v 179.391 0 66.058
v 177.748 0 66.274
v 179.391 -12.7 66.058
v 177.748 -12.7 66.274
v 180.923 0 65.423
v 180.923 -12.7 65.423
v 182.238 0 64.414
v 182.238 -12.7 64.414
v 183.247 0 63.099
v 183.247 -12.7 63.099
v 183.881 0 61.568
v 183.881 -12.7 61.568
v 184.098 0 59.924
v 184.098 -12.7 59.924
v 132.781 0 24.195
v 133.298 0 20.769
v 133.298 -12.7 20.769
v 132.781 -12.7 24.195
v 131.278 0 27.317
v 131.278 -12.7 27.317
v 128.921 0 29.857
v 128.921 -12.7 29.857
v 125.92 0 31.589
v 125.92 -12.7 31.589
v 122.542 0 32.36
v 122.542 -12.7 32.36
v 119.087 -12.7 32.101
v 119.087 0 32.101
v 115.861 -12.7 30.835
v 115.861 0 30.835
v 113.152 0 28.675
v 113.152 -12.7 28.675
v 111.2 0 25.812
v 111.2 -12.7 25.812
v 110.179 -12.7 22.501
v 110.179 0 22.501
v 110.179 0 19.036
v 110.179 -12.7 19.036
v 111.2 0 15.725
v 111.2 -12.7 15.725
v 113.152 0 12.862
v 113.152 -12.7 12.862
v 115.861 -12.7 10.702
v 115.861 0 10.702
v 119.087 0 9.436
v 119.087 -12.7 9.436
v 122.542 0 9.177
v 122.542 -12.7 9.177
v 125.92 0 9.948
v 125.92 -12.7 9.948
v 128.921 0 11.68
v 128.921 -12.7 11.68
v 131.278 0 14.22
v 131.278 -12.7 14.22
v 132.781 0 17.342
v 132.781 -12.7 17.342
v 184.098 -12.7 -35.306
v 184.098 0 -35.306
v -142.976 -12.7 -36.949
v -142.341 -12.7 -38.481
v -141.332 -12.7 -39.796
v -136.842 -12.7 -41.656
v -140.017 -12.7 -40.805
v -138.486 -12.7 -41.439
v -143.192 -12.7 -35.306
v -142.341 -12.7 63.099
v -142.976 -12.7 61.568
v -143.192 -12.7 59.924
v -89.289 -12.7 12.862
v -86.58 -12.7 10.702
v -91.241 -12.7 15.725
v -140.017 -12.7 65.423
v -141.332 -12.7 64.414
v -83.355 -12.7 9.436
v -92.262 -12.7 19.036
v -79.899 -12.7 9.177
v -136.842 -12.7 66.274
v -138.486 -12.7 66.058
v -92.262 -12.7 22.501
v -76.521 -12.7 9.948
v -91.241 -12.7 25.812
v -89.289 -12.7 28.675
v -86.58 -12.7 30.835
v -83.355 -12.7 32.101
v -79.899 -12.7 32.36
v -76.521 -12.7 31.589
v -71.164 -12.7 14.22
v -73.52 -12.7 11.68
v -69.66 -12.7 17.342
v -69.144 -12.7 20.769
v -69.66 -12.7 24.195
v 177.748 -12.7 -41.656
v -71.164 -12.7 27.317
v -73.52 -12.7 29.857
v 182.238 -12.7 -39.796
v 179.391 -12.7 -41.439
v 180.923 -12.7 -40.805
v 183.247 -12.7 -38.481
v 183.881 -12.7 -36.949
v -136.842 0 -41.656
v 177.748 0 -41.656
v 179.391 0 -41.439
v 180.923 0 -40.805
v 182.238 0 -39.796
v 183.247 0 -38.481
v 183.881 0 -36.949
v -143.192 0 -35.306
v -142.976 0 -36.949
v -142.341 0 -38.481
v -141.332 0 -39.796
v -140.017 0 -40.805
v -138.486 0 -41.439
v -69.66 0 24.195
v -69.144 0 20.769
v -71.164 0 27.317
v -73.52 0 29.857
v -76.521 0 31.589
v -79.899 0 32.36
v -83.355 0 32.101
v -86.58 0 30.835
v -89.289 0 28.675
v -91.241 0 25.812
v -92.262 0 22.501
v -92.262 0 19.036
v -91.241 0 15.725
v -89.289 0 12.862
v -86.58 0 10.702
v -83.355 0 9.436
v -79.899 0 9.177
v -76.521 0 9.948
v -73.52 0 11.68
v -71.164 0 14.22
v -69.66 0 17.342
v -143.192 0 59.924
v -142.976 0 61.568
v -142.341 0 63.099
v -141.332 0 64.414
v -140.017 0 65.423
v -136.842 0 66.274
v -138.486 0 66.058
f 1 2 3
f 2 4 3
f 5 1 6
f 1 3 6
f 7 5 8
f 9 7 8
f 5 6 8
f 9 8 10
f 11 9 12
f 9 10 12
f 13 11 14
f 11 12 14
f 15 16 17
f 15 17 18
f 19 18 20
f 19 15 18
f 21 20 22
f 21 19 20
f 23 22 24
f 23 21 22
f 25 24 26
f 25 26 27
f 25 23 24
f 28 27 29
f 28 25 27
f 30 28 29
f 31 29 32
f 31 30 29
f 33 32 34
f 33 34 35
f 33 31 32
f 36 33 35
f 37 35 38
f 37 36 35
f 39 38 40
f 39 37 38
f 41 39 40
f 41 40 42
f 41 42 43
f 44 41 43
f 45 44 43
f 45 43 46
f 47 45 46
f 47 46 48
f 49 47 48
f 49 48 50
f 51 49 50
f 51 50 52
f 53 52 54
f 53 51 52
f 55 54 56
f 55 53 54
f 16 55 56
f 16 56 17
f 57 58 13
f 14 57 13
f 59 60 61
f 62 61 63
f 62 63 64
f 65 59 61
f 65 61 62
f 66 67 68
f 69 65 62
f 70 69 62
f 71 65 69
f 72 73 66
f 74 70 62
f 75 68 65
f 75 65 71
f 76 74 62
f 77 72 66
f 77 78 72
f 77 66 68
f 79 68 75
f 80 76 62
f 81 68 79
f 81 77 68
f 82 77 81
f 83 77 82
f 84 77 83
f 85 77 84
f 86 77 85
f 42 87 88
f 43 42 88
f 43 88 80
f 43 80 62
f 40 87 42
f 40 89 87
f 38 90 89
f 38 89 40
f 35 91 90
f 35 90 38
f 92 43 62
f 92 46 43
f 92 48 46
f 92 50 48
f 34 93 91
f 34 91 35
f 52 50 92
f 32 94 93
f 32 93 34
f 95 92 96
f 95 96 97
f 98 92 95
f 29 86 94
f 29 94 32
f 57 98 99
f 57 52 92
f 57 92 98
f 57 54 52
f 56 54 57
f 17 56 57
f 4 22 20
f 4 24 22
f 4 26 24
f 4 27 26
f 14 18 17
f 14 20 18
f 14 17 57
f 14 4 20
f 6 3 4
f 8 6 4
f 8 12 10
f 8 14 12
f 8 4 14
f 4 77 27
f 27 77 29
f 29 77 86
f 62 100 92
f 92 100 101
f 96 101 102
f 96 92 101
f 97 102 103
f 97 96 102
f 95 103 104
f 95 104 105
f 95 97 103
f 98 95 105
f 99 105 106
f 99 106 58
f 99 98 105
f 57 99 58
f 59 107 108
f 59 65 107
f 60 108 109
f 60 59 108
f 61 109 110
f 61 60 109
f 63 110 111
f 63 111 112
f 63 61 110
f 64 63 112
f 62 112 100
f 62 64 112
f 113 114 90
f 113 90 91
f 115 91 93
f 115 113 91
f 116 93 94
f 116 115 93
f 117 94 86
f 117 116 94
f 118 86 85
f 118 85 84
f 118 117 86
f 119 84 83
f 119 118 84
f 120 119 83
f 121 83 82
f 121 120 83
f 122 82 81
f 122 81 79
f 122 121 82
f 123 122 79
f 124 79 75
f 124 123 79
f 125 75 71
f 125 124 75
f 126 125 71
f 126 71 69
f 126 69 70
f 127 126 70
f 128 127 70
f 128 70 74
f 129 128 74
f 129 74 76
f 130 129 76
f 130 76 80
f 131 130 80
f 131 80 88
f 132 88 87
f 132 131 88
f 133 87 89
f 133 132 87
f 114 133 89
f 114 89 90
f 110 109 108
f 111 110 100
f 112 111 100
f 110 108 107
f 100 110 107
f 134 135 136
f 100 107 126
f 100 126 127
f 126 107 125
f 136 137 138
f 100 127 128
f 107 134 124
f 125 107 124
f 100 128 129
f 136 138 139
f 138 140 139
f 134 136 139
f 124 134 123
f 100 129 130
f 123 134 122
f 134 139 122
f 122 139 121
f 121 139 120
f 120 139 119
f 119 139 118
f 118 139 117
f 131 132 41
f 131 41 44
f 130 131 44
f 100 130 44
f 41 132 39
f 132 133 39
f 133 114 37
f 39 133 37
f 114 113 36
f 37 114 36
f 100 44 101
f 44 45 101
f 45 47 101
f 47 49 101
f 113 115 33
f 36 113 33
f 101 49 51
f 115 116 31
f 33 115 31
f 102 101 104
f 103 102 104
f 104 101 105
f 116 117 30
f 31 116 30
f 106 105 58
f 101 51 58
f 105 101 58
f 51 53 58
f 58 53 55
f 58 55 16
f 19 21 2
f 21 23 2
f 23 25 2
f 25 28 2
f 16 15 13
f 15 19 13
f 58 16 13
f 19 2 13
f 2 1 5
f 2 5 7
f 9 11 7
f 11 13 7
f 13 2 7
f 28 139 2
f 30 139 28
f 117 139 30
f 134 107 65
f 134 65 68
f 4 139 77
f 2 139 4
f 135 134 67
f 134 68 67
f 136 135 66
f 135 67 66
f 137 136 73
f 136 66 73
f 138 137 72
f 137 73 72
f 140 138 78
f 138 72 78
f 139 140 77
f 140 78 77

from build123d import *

# Parameters (mm, degrees)
F0_W     = 327.289753
F0_H     = 107.929777
F0_R     = 11.624246
F1_DEPTH = 12.7
F2_R     = 6.35


with BuildPart() as f1:
    # F0 (on Front) → F1 (new body)
    with BuildSketch(Plane.XZ):
        with Locations((20.452689, 12.309231)):
            Rectangle(F0_W, F0_H)
        with Locations((-80.767942, 20.768589)):
            Circle(F0_R, mode=Mode.SUBTRACT)
        with Locations((121.673319, 20.768589)):
            Circle(F0_R, mode=Mode.SUBTRACT)
    extrude(amount=F1_DEPTH)

    # F2
    f2_edges = [f1.edges().sort_by_distance(p)[0] for p in [
        (-143.192188, -6.35, 66.27412),
        (-143.192188, -6.35, -41.655657),
        (184.097565, -6.35, -41.655657),
        (184.097565, -6.35, 66.27412),
    ]]
    fillet(f2_edges, radius=F2_R)


solid = f1.part
